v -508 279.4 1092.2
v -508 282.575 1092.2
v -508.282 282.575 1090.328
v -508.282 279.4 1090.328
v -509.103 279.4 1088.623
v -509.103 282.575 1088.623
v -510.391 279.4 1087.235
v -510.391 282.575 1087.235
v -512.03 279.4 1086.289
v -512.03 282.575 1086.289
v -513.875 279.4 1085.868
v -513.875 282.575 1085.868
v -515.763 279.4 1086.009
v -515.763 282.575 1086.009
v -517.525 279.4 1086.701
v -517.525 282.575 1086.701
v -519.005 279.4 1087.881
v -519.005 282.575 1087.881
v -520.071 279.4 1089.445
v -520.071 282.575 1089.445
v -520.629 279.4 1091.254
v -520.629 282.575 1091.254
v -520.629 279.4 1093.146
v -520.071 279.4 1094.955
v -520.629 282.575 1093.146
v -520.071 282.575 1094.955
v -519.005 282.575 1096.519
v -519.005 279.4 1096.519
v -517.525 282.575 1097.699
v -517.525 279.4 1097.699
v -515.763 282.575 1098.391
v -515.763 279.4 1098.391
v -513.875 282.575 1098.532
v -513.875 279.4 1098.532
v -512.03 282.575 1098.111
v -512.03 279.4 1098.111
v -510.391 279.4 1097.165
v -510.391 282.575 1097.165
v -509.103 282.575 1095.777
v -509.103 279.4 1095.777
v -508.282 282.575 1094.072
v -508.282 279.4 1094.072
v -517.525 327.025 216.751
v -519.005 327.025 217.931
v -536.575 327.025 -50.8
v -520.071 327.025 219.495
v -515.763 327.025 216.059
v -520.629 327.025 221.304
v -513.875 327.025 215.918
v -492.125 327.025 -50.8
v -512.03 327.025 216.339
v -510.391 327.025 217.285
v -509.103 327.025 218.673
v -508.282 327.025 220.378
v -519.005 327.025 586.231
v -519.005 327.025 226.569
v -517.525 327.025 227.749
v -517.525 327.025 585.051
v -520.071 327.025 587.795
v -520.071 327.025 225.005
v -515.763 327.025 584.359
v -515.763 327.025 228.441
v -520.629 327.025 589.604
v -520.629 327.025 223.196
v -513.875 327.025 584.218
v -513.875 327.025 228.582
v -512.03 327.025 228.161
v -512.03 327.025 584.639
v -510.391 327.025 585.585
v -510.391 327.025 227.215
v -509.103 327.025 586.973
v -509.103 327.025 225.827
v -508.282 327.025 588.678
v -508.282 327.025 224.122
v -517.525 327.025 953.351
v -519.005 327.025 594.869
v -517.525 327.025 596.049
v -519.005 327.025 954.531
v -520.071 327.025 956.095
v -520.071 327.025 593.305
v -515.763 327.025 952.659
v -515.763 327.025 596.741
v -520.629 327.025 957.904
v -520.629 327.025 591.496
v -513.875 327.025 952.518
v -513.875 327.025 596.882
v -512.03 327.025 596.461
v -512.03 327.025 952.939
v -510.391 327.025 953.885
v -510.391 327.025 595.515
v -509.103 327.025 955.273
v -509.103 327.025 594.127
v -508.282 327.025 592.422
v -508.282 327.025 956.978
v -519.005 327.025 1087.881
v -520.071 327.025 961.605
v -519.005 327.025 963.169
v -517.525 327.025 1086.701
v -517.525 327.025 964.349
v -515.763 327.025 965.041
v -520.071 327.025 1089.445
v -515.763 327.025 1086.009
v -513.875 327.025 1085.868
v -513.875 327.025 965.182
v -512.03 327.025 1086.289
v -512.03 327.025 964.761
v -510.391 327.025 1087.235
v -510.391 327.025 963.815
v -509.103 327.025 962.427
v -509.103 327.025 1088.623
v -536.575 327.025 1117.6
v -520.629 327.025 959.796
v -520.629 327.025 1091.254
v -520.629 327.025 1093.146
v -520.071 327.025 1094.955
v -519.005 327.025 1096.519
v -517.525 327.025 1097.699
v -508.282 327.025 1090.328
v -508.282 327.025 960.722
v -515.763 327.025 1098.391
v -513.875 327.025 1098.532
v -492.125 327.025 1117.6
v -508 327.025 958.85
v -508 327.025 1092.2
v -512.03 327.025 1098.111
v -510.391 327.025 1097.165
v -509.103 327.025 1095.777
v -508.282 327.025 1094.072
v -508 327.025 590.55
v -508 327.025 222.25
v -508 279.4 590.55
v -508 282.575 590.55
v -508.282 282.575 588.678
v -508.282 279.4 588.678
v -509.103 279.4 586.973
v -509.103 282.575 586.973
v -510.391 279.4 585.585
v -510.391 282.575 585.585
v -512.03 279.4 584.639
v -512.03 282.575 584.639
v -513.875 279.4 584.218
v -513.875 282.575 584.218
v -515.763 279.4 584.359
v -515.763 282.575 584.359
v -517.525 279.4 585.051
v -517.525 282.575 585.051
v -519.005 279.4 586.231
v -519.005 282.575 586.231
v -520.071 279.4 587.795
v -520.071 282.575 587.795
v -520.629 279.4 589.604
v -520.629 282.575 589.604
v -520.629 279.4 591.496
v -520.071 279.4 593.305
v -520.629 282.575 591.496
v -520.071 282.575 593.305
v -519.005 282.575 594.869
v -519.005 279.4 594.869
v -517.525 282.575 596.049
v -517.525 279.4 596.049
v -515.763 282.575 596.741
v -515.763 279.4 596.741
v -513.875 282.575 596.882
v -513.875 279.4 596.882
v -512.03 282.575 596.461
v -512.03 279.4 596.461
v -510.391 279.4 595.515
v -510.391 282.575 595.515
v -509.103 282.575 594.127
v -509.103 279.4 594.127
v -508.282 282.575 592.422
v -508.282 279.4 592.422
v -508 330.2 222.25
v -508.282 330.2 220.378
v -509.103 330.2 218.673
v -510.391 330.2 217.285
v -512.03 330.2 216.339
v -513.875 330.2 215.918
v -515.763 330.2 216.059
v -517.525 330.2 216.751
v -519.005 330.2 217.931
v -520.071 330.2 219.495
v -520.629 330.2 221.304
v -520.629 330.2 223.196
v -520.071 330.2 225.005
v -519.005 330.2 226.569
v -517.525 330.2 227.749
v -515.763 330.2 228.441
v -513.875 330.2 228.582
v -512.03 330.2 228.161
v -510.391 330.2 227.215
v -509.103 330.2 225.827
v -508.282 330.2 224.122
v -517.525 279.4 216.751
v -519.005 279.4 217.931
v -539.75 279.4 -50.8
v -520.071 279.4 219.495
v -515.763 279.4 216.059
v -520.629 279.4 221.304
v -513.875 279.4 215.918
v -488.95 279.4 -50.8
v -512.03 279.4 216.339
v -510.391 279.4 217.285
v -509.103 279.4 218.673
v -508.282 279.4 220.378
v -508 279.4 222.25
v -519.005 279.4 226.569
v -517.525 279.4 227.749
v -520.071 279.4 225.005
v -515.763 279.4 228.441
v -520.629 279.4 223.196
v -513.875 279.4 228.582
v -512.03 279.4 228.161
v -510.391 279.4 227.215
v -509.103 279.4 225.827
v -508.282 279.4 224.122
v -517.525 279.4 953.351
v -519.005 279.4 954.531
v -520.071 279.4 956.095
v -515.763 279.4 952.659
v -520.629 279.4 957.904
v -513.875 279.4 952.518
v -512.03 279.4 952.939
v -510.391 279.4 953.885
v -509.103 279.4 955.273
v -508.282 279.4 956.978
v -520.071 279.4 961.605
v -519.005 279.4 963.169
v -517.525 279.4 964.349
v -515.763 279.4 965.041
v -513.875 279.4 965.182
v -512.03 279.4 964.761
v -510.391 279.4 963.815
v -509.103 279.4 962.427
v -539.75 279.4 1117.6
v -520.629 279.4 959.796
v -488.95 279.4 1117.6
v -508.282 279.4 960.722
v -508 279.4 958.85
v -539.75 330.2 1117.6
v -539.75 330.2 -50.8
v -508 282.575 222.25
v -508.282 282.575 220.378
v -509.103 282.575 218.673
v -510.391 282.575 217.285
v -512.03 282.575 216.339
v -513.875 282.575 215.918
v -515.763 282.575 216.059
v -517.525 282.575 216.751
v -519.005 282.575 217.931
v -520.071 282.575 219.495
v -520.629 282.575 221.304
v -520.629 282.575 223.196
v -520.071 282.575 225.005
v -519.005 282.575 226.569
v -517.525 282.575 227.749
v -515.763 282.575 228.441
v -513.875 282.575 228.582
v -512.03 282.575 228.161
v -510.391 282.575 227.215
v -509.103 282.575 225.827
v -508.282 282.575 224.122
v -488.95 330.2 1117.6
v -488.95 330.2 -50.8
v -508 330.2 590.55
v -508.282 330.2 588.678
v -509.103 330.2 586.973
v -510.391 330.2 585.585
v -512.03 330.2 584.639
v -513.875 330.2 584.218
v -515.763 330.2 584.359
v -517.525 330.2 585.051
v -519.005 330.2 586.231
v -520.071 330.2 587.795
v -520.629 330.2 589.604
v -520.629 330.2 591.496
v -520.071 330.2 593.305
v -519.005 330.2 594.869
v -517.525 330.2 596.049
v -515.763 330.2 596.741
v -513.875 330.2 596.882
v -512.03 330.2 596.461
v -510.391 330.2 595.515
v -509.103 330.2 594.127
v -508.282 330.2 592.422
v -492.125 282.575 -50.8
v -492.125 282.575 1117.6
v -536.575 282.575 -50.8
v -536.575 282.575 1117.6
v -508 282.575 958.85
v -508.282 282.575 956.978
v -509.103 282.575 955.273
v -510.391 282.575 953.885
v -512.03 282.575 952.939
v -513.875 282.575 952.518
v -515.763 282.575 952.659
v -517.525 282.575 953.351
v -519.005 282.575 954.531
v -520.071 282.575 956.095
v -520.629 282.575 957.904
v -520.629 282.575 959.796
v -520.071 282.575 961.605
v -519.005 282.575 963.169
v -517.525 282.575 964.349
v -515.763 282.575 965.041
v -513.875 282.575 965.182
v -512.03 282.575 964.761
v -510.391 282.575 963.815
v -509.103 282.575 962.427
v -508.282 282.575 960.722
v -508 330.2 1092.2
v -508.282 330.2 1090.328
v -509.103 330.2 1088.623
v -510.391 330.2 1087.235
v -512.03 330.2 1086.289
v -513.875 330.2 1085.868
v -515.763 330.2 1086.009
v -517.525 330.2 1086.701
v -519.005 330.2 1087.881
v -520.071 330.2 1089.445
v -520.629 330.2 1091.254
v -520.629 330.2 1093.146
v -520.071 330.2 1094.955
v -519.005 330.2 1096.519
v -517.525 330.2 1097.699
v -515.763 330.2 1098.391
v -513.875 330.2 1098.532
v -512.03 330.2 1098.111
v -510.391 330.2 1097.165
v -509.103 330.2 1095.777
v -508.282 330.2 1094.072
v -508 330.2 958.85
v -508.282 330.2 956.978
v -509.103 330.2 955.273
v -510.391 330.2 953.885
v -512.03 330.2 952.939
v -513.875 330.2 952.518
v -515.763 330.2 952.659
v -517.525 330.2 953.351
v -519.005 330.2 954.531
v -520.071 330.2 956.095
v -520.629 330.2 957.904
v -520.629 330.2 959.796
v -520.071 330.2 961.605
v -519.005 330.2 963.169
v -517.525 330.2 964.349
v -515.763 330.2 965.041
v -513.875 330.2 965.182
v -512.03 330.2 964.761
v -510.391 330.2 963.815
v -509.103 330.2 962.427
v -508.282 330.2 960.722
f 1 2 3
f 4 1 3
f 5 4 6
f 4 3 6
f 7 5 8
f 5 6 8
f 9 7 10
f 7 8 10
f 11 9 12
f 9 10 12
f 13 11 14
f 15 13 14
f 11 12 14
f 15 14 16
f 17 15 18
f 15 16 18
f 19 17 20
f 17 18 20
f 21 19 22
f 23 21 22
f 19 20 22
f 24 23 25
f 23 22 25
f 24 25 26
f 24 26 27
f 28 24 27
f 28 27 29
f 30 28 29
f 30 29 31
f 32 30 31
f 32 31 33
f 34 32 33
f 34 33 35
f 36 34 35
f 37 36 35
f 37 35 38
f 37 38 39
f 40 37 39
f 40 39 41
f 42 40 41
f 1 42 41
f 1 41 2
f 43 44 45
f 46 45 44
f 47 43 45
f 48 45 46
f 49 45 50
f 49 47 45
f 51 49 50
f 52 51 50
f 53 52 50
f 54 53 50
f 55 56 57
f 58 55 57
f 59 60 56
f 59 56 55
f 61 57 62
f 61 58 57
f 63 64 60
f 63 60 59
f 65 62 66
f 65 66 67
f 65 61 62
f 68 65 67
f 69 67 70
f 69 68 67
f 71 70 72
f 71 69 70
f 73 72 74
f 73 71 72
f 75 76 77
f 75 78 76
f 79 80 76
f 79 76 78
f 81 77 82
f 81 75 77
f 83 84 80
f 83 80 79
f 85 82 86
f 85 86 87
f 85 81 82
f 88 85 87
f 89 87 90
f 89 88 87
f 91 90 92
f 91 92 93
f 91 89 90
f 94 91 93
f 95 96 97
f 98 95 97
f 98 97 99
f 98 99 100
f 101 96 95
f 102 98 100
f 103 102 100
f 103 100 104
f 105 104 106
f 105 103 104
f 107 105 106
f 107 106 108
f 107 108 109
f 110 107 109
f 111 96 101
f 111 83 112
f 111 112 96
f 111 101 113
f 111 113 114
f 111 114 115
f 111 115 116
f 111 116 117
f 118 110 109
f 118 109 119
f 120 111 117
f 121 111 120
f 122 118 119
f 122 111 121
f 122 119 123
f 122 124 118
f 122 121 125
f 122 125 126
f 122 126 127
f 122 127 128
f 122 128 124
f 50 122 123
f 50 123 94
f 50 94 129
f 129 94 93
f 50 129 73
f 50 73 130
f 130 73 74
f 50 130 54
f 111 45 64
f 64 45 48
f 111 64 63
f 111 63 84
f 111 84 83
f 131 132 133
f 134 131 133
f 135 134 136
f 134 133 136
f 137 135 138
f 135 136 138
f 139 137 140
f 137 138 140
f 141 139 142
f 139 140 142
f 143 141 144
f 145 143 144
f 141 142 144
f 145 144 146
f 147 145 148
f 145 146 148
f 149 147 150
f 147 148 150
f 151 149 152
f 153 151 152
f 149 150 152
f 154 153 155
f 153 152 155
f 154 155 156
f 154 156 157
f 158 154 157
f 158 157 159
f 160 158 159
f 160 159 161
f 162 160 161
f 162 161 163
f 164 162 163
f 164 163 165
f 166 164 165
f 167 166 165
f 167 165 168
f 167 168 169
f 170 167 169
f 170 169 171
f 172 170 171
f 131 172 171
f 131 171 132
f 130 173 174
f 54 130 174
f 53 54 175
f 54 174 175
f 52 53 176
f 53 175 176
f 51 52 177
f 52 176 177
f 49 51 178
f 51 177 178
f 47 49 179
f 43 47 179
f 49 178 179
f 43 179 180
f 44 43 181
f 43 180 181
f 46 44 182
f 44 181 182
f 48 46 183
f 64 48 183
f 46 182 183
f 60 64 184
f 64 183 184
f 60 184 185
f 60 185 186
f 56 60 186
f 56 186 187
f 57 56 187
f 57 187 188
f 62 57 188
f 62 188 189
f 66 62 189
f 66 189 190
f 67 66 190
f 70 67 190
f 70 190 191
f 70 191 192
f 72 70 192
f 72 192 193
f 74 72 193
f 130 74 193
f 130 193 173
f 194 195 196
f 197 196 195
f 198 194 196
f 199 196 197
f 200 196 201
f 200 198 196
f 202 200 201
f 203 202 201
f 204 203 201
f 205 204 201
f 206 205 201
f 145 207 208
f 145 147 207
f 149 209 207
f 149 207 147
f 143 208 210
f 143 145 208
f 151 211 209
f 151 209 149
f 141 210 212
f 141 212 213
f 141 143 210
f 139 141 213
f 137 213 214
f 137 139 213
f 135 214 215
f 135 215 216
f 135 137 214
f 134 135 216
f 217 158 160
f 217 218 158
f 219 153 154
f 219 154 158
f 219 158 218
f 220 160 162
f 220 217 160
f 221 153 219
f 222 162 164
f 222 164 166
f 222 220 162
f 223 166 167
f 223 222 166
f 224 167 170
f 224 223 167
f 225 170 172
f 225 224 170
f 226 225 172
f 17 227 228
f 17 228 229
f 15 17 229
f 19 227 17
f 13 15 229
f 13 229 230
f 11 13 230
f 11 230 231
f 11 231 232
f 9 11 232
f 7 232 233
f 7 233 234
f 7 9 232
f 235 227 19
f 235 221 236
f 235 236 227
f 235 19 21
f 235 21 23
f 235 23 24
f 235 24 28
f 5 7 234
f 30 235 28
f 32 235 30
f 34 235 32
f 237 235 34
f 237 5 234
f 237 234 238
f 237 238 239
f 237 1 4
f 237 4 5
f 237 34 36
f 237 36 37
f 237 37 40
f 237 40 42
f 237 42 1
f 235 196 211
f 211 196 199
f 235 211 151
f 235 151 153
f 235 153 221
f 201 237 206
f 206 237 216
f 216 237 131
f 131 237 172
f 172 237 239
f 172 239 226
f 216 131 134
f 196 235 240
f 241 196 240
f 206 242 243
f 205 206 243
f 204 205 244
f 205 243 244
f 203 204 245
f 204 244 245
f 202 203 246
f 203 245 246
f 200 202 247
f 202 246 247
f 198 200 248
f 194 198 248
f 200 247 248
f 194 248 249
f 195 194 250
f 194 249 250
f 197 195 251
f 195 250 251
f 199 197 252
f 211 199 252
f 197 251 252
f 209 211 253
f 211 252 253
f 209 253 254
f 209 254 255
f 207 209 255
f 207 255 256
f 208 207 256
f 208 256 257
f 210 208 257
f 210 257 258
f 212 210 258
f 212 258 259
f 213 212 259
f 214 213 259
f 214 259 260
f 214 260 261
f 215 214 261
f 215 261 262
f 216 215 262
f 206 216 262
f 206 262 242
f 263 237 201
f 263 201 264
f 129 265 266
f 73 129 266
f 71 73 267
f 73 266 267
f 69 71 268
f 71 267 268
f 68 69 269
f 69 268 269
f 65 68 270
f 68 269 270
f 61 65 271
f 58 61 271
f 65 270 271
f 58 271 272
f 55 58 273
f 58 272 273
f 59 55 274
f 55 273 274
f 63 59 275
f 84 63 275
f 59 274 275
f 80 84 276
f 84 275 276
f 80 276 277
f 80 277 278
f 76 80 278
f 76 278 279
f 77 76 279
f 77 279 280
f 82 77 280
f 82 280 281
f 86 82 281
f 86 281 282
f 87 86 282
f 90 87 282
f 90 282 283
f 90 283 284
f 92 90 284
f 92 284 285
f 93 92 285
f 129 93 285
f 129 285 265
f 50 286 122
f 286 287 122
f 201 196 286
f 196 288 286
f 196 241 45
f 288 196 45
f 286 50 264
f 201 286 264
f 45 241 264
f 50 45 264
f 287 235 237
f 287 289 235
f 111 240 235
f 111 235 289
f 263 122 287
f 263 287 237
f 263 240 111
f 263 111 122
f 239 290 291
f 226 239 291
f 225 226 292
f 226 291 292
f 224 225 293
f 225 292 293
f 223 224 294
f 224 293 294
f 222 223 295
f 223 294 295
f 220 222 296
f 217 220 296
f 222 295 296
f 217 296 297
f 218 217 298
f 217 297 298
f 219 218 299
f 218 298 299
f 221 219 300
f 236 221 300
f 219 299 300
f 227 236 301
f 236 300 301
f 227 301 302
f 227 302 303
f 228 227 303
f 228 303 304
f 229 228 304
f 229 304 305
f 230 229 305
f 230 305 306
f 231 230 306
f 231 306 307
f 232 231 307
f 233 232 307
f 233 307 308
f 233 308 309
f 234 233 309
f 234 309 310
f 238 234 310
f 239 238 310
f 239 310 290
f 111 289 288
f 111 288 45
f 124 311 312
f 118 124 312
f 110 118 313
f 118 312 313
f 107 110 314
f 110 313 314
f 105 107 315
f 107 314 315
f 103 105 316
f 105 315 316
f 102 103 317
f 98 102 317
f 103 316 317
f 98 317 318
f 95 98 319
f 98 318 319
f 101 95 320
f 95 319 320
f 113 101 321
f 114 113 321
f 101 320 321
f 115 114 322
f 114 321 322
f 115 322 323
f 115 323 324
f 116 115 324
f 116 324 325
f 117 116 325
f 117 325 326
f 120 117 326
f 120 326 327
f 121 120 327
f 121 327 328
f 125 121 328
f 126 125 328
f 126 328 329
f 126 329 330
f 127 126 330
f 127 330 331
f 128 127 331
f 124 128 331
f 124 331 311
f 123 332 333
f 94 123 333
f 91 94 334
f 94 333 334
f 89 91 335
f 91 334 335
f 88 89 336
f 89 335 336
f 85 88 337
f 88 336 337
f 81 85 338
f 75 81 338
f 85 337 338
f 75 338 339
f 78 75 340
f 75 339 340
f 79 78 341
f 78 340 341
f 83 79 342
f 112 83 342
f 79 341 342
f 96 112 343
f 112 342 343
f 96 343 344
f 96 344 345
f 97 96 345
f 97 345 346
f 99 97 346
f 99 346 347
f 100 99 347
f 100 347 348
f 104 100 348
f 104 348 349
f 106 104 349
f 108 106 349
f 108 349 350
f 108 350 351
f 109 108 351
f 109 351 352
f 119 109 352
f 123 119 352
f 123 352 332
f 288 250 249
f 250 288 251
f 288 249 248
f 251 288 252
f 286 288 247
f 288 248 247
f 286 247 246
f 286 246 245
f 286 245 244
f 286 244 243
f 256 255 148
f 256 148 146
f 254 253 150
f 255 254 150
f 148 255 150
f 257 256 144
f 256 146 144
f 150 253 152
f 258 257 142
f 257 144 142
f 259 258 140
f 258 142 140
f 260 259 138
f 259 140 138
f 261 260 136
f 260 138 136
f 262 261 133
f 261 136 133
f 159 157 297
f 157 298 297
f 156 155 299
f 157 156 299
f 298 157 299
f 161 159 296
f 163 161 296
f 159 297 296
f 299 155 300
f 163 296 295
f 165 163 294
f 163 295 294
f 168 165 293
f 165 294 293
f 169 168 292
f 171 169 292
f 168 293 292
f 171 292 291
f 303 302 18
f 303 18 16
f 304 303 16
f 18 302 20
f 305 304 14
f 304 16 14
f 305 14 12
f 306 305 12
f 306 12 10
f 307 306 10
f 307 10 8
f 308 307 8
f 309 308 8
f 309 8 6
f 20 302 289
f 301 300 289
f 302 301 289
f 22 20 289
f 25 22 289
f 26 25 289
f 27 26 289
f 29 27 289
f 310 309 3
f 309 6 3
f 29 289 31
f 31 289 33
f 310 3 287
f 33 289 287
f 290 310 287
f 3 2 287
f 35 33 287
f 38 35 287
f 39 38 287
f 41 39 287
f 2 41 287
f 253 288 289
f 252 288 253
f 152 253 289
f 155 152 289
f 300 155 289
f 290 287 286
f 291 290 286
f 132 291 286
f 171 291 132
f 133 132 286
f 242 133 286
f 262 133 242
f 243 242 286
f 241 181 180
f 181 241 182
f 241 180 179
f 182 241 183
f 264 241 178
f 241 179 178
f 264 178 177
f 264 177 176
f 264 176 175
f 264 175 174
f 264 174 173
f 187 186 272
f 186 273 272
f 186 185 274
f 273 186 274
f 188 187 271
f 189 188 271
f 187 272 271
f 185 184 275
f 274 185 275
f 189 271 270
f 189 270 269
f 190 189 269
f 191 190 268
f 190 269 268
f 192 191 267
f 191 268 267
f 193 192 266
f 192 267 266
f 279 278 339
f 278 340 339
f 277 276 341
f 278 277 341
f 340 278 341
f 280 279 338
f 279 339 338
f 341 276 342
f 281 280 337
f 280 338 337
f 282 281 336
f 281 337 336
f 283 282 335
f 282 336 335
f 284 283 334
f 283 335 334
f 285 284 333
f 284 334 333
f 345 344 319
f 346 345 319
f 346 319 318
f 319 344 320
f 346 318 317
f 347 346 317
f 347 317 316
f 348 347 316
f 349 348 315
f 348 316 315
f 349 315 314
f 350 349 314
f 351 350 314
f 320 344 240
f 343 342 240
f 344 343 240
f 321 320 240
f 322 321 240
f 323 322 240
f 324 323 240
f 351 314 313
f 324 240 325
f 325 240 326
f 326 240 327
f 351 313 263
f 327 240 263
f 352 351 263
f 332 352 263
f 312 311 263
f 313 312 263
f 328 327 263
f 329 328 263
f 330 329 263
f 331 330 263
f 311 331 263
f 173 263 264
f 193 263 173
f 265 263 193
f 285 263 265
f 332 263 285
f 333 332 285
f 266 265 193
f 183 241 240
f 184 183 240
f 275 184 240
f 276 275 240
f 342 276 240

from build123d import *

# Parameters (mm, degrees)
SKETCH1_W           = 50.8
SKETCH1_H           = 50.8
SKETCH1_W_2         = 44.45
SKETCH1_H_2         = 44.45
EXTRUDE1_DEPTH      = 1117.6
EXTRUDE1_DEPTH_BACK = 50.8
SKETCH3_R           = 6.35
CUT_EXTRUDE2_DEPTH  = 51.8


with BuildPart() as part:
    # Sketch1 → Extrude1 (new body, two sides)
    with BuildSketch(Plane.XY) as extrude1_sk:
        with Locations((-514.35, 304.8)):
            Rectangle(SKETCH1_W, SKETCH1_H)
        with Locations((-514.35, 304.8)):
            Rectangle(SKETCH1_W_2, SKETCH1_H_2, mode=Mode.SUBTRACT)
    extrude(amount=EXTRUDE1_DEPTH)
    extrude(extrude1_sk.sketch, amount=-EXTRUDE1_DEPTH_BACK)

    # Sketch3 → Cut-Extrude2 (cut, through all)
    with BuildSketch(Plane(origin=(0, 330.2, 0), x_dir=(1, 0, 0), z_dir=(0, 1, 0))):
        with Locations((-514.35, -1092.2)):
            Circle(SKETCH3_R)
        with Locations((-514.35, -958.85)):
            Circle(SKETCH3_R)
        with Locations((-514.35, -590.55)):
            Circle(SKETCH3_R)
        with Locations((-514.35, -222.25)):
            Circle(SKETCH3_R)
    extrude(amount=-CUT_EXTRUDE2_DEPTH, mode=Mode.SUBTRACT)


solid = part.part
